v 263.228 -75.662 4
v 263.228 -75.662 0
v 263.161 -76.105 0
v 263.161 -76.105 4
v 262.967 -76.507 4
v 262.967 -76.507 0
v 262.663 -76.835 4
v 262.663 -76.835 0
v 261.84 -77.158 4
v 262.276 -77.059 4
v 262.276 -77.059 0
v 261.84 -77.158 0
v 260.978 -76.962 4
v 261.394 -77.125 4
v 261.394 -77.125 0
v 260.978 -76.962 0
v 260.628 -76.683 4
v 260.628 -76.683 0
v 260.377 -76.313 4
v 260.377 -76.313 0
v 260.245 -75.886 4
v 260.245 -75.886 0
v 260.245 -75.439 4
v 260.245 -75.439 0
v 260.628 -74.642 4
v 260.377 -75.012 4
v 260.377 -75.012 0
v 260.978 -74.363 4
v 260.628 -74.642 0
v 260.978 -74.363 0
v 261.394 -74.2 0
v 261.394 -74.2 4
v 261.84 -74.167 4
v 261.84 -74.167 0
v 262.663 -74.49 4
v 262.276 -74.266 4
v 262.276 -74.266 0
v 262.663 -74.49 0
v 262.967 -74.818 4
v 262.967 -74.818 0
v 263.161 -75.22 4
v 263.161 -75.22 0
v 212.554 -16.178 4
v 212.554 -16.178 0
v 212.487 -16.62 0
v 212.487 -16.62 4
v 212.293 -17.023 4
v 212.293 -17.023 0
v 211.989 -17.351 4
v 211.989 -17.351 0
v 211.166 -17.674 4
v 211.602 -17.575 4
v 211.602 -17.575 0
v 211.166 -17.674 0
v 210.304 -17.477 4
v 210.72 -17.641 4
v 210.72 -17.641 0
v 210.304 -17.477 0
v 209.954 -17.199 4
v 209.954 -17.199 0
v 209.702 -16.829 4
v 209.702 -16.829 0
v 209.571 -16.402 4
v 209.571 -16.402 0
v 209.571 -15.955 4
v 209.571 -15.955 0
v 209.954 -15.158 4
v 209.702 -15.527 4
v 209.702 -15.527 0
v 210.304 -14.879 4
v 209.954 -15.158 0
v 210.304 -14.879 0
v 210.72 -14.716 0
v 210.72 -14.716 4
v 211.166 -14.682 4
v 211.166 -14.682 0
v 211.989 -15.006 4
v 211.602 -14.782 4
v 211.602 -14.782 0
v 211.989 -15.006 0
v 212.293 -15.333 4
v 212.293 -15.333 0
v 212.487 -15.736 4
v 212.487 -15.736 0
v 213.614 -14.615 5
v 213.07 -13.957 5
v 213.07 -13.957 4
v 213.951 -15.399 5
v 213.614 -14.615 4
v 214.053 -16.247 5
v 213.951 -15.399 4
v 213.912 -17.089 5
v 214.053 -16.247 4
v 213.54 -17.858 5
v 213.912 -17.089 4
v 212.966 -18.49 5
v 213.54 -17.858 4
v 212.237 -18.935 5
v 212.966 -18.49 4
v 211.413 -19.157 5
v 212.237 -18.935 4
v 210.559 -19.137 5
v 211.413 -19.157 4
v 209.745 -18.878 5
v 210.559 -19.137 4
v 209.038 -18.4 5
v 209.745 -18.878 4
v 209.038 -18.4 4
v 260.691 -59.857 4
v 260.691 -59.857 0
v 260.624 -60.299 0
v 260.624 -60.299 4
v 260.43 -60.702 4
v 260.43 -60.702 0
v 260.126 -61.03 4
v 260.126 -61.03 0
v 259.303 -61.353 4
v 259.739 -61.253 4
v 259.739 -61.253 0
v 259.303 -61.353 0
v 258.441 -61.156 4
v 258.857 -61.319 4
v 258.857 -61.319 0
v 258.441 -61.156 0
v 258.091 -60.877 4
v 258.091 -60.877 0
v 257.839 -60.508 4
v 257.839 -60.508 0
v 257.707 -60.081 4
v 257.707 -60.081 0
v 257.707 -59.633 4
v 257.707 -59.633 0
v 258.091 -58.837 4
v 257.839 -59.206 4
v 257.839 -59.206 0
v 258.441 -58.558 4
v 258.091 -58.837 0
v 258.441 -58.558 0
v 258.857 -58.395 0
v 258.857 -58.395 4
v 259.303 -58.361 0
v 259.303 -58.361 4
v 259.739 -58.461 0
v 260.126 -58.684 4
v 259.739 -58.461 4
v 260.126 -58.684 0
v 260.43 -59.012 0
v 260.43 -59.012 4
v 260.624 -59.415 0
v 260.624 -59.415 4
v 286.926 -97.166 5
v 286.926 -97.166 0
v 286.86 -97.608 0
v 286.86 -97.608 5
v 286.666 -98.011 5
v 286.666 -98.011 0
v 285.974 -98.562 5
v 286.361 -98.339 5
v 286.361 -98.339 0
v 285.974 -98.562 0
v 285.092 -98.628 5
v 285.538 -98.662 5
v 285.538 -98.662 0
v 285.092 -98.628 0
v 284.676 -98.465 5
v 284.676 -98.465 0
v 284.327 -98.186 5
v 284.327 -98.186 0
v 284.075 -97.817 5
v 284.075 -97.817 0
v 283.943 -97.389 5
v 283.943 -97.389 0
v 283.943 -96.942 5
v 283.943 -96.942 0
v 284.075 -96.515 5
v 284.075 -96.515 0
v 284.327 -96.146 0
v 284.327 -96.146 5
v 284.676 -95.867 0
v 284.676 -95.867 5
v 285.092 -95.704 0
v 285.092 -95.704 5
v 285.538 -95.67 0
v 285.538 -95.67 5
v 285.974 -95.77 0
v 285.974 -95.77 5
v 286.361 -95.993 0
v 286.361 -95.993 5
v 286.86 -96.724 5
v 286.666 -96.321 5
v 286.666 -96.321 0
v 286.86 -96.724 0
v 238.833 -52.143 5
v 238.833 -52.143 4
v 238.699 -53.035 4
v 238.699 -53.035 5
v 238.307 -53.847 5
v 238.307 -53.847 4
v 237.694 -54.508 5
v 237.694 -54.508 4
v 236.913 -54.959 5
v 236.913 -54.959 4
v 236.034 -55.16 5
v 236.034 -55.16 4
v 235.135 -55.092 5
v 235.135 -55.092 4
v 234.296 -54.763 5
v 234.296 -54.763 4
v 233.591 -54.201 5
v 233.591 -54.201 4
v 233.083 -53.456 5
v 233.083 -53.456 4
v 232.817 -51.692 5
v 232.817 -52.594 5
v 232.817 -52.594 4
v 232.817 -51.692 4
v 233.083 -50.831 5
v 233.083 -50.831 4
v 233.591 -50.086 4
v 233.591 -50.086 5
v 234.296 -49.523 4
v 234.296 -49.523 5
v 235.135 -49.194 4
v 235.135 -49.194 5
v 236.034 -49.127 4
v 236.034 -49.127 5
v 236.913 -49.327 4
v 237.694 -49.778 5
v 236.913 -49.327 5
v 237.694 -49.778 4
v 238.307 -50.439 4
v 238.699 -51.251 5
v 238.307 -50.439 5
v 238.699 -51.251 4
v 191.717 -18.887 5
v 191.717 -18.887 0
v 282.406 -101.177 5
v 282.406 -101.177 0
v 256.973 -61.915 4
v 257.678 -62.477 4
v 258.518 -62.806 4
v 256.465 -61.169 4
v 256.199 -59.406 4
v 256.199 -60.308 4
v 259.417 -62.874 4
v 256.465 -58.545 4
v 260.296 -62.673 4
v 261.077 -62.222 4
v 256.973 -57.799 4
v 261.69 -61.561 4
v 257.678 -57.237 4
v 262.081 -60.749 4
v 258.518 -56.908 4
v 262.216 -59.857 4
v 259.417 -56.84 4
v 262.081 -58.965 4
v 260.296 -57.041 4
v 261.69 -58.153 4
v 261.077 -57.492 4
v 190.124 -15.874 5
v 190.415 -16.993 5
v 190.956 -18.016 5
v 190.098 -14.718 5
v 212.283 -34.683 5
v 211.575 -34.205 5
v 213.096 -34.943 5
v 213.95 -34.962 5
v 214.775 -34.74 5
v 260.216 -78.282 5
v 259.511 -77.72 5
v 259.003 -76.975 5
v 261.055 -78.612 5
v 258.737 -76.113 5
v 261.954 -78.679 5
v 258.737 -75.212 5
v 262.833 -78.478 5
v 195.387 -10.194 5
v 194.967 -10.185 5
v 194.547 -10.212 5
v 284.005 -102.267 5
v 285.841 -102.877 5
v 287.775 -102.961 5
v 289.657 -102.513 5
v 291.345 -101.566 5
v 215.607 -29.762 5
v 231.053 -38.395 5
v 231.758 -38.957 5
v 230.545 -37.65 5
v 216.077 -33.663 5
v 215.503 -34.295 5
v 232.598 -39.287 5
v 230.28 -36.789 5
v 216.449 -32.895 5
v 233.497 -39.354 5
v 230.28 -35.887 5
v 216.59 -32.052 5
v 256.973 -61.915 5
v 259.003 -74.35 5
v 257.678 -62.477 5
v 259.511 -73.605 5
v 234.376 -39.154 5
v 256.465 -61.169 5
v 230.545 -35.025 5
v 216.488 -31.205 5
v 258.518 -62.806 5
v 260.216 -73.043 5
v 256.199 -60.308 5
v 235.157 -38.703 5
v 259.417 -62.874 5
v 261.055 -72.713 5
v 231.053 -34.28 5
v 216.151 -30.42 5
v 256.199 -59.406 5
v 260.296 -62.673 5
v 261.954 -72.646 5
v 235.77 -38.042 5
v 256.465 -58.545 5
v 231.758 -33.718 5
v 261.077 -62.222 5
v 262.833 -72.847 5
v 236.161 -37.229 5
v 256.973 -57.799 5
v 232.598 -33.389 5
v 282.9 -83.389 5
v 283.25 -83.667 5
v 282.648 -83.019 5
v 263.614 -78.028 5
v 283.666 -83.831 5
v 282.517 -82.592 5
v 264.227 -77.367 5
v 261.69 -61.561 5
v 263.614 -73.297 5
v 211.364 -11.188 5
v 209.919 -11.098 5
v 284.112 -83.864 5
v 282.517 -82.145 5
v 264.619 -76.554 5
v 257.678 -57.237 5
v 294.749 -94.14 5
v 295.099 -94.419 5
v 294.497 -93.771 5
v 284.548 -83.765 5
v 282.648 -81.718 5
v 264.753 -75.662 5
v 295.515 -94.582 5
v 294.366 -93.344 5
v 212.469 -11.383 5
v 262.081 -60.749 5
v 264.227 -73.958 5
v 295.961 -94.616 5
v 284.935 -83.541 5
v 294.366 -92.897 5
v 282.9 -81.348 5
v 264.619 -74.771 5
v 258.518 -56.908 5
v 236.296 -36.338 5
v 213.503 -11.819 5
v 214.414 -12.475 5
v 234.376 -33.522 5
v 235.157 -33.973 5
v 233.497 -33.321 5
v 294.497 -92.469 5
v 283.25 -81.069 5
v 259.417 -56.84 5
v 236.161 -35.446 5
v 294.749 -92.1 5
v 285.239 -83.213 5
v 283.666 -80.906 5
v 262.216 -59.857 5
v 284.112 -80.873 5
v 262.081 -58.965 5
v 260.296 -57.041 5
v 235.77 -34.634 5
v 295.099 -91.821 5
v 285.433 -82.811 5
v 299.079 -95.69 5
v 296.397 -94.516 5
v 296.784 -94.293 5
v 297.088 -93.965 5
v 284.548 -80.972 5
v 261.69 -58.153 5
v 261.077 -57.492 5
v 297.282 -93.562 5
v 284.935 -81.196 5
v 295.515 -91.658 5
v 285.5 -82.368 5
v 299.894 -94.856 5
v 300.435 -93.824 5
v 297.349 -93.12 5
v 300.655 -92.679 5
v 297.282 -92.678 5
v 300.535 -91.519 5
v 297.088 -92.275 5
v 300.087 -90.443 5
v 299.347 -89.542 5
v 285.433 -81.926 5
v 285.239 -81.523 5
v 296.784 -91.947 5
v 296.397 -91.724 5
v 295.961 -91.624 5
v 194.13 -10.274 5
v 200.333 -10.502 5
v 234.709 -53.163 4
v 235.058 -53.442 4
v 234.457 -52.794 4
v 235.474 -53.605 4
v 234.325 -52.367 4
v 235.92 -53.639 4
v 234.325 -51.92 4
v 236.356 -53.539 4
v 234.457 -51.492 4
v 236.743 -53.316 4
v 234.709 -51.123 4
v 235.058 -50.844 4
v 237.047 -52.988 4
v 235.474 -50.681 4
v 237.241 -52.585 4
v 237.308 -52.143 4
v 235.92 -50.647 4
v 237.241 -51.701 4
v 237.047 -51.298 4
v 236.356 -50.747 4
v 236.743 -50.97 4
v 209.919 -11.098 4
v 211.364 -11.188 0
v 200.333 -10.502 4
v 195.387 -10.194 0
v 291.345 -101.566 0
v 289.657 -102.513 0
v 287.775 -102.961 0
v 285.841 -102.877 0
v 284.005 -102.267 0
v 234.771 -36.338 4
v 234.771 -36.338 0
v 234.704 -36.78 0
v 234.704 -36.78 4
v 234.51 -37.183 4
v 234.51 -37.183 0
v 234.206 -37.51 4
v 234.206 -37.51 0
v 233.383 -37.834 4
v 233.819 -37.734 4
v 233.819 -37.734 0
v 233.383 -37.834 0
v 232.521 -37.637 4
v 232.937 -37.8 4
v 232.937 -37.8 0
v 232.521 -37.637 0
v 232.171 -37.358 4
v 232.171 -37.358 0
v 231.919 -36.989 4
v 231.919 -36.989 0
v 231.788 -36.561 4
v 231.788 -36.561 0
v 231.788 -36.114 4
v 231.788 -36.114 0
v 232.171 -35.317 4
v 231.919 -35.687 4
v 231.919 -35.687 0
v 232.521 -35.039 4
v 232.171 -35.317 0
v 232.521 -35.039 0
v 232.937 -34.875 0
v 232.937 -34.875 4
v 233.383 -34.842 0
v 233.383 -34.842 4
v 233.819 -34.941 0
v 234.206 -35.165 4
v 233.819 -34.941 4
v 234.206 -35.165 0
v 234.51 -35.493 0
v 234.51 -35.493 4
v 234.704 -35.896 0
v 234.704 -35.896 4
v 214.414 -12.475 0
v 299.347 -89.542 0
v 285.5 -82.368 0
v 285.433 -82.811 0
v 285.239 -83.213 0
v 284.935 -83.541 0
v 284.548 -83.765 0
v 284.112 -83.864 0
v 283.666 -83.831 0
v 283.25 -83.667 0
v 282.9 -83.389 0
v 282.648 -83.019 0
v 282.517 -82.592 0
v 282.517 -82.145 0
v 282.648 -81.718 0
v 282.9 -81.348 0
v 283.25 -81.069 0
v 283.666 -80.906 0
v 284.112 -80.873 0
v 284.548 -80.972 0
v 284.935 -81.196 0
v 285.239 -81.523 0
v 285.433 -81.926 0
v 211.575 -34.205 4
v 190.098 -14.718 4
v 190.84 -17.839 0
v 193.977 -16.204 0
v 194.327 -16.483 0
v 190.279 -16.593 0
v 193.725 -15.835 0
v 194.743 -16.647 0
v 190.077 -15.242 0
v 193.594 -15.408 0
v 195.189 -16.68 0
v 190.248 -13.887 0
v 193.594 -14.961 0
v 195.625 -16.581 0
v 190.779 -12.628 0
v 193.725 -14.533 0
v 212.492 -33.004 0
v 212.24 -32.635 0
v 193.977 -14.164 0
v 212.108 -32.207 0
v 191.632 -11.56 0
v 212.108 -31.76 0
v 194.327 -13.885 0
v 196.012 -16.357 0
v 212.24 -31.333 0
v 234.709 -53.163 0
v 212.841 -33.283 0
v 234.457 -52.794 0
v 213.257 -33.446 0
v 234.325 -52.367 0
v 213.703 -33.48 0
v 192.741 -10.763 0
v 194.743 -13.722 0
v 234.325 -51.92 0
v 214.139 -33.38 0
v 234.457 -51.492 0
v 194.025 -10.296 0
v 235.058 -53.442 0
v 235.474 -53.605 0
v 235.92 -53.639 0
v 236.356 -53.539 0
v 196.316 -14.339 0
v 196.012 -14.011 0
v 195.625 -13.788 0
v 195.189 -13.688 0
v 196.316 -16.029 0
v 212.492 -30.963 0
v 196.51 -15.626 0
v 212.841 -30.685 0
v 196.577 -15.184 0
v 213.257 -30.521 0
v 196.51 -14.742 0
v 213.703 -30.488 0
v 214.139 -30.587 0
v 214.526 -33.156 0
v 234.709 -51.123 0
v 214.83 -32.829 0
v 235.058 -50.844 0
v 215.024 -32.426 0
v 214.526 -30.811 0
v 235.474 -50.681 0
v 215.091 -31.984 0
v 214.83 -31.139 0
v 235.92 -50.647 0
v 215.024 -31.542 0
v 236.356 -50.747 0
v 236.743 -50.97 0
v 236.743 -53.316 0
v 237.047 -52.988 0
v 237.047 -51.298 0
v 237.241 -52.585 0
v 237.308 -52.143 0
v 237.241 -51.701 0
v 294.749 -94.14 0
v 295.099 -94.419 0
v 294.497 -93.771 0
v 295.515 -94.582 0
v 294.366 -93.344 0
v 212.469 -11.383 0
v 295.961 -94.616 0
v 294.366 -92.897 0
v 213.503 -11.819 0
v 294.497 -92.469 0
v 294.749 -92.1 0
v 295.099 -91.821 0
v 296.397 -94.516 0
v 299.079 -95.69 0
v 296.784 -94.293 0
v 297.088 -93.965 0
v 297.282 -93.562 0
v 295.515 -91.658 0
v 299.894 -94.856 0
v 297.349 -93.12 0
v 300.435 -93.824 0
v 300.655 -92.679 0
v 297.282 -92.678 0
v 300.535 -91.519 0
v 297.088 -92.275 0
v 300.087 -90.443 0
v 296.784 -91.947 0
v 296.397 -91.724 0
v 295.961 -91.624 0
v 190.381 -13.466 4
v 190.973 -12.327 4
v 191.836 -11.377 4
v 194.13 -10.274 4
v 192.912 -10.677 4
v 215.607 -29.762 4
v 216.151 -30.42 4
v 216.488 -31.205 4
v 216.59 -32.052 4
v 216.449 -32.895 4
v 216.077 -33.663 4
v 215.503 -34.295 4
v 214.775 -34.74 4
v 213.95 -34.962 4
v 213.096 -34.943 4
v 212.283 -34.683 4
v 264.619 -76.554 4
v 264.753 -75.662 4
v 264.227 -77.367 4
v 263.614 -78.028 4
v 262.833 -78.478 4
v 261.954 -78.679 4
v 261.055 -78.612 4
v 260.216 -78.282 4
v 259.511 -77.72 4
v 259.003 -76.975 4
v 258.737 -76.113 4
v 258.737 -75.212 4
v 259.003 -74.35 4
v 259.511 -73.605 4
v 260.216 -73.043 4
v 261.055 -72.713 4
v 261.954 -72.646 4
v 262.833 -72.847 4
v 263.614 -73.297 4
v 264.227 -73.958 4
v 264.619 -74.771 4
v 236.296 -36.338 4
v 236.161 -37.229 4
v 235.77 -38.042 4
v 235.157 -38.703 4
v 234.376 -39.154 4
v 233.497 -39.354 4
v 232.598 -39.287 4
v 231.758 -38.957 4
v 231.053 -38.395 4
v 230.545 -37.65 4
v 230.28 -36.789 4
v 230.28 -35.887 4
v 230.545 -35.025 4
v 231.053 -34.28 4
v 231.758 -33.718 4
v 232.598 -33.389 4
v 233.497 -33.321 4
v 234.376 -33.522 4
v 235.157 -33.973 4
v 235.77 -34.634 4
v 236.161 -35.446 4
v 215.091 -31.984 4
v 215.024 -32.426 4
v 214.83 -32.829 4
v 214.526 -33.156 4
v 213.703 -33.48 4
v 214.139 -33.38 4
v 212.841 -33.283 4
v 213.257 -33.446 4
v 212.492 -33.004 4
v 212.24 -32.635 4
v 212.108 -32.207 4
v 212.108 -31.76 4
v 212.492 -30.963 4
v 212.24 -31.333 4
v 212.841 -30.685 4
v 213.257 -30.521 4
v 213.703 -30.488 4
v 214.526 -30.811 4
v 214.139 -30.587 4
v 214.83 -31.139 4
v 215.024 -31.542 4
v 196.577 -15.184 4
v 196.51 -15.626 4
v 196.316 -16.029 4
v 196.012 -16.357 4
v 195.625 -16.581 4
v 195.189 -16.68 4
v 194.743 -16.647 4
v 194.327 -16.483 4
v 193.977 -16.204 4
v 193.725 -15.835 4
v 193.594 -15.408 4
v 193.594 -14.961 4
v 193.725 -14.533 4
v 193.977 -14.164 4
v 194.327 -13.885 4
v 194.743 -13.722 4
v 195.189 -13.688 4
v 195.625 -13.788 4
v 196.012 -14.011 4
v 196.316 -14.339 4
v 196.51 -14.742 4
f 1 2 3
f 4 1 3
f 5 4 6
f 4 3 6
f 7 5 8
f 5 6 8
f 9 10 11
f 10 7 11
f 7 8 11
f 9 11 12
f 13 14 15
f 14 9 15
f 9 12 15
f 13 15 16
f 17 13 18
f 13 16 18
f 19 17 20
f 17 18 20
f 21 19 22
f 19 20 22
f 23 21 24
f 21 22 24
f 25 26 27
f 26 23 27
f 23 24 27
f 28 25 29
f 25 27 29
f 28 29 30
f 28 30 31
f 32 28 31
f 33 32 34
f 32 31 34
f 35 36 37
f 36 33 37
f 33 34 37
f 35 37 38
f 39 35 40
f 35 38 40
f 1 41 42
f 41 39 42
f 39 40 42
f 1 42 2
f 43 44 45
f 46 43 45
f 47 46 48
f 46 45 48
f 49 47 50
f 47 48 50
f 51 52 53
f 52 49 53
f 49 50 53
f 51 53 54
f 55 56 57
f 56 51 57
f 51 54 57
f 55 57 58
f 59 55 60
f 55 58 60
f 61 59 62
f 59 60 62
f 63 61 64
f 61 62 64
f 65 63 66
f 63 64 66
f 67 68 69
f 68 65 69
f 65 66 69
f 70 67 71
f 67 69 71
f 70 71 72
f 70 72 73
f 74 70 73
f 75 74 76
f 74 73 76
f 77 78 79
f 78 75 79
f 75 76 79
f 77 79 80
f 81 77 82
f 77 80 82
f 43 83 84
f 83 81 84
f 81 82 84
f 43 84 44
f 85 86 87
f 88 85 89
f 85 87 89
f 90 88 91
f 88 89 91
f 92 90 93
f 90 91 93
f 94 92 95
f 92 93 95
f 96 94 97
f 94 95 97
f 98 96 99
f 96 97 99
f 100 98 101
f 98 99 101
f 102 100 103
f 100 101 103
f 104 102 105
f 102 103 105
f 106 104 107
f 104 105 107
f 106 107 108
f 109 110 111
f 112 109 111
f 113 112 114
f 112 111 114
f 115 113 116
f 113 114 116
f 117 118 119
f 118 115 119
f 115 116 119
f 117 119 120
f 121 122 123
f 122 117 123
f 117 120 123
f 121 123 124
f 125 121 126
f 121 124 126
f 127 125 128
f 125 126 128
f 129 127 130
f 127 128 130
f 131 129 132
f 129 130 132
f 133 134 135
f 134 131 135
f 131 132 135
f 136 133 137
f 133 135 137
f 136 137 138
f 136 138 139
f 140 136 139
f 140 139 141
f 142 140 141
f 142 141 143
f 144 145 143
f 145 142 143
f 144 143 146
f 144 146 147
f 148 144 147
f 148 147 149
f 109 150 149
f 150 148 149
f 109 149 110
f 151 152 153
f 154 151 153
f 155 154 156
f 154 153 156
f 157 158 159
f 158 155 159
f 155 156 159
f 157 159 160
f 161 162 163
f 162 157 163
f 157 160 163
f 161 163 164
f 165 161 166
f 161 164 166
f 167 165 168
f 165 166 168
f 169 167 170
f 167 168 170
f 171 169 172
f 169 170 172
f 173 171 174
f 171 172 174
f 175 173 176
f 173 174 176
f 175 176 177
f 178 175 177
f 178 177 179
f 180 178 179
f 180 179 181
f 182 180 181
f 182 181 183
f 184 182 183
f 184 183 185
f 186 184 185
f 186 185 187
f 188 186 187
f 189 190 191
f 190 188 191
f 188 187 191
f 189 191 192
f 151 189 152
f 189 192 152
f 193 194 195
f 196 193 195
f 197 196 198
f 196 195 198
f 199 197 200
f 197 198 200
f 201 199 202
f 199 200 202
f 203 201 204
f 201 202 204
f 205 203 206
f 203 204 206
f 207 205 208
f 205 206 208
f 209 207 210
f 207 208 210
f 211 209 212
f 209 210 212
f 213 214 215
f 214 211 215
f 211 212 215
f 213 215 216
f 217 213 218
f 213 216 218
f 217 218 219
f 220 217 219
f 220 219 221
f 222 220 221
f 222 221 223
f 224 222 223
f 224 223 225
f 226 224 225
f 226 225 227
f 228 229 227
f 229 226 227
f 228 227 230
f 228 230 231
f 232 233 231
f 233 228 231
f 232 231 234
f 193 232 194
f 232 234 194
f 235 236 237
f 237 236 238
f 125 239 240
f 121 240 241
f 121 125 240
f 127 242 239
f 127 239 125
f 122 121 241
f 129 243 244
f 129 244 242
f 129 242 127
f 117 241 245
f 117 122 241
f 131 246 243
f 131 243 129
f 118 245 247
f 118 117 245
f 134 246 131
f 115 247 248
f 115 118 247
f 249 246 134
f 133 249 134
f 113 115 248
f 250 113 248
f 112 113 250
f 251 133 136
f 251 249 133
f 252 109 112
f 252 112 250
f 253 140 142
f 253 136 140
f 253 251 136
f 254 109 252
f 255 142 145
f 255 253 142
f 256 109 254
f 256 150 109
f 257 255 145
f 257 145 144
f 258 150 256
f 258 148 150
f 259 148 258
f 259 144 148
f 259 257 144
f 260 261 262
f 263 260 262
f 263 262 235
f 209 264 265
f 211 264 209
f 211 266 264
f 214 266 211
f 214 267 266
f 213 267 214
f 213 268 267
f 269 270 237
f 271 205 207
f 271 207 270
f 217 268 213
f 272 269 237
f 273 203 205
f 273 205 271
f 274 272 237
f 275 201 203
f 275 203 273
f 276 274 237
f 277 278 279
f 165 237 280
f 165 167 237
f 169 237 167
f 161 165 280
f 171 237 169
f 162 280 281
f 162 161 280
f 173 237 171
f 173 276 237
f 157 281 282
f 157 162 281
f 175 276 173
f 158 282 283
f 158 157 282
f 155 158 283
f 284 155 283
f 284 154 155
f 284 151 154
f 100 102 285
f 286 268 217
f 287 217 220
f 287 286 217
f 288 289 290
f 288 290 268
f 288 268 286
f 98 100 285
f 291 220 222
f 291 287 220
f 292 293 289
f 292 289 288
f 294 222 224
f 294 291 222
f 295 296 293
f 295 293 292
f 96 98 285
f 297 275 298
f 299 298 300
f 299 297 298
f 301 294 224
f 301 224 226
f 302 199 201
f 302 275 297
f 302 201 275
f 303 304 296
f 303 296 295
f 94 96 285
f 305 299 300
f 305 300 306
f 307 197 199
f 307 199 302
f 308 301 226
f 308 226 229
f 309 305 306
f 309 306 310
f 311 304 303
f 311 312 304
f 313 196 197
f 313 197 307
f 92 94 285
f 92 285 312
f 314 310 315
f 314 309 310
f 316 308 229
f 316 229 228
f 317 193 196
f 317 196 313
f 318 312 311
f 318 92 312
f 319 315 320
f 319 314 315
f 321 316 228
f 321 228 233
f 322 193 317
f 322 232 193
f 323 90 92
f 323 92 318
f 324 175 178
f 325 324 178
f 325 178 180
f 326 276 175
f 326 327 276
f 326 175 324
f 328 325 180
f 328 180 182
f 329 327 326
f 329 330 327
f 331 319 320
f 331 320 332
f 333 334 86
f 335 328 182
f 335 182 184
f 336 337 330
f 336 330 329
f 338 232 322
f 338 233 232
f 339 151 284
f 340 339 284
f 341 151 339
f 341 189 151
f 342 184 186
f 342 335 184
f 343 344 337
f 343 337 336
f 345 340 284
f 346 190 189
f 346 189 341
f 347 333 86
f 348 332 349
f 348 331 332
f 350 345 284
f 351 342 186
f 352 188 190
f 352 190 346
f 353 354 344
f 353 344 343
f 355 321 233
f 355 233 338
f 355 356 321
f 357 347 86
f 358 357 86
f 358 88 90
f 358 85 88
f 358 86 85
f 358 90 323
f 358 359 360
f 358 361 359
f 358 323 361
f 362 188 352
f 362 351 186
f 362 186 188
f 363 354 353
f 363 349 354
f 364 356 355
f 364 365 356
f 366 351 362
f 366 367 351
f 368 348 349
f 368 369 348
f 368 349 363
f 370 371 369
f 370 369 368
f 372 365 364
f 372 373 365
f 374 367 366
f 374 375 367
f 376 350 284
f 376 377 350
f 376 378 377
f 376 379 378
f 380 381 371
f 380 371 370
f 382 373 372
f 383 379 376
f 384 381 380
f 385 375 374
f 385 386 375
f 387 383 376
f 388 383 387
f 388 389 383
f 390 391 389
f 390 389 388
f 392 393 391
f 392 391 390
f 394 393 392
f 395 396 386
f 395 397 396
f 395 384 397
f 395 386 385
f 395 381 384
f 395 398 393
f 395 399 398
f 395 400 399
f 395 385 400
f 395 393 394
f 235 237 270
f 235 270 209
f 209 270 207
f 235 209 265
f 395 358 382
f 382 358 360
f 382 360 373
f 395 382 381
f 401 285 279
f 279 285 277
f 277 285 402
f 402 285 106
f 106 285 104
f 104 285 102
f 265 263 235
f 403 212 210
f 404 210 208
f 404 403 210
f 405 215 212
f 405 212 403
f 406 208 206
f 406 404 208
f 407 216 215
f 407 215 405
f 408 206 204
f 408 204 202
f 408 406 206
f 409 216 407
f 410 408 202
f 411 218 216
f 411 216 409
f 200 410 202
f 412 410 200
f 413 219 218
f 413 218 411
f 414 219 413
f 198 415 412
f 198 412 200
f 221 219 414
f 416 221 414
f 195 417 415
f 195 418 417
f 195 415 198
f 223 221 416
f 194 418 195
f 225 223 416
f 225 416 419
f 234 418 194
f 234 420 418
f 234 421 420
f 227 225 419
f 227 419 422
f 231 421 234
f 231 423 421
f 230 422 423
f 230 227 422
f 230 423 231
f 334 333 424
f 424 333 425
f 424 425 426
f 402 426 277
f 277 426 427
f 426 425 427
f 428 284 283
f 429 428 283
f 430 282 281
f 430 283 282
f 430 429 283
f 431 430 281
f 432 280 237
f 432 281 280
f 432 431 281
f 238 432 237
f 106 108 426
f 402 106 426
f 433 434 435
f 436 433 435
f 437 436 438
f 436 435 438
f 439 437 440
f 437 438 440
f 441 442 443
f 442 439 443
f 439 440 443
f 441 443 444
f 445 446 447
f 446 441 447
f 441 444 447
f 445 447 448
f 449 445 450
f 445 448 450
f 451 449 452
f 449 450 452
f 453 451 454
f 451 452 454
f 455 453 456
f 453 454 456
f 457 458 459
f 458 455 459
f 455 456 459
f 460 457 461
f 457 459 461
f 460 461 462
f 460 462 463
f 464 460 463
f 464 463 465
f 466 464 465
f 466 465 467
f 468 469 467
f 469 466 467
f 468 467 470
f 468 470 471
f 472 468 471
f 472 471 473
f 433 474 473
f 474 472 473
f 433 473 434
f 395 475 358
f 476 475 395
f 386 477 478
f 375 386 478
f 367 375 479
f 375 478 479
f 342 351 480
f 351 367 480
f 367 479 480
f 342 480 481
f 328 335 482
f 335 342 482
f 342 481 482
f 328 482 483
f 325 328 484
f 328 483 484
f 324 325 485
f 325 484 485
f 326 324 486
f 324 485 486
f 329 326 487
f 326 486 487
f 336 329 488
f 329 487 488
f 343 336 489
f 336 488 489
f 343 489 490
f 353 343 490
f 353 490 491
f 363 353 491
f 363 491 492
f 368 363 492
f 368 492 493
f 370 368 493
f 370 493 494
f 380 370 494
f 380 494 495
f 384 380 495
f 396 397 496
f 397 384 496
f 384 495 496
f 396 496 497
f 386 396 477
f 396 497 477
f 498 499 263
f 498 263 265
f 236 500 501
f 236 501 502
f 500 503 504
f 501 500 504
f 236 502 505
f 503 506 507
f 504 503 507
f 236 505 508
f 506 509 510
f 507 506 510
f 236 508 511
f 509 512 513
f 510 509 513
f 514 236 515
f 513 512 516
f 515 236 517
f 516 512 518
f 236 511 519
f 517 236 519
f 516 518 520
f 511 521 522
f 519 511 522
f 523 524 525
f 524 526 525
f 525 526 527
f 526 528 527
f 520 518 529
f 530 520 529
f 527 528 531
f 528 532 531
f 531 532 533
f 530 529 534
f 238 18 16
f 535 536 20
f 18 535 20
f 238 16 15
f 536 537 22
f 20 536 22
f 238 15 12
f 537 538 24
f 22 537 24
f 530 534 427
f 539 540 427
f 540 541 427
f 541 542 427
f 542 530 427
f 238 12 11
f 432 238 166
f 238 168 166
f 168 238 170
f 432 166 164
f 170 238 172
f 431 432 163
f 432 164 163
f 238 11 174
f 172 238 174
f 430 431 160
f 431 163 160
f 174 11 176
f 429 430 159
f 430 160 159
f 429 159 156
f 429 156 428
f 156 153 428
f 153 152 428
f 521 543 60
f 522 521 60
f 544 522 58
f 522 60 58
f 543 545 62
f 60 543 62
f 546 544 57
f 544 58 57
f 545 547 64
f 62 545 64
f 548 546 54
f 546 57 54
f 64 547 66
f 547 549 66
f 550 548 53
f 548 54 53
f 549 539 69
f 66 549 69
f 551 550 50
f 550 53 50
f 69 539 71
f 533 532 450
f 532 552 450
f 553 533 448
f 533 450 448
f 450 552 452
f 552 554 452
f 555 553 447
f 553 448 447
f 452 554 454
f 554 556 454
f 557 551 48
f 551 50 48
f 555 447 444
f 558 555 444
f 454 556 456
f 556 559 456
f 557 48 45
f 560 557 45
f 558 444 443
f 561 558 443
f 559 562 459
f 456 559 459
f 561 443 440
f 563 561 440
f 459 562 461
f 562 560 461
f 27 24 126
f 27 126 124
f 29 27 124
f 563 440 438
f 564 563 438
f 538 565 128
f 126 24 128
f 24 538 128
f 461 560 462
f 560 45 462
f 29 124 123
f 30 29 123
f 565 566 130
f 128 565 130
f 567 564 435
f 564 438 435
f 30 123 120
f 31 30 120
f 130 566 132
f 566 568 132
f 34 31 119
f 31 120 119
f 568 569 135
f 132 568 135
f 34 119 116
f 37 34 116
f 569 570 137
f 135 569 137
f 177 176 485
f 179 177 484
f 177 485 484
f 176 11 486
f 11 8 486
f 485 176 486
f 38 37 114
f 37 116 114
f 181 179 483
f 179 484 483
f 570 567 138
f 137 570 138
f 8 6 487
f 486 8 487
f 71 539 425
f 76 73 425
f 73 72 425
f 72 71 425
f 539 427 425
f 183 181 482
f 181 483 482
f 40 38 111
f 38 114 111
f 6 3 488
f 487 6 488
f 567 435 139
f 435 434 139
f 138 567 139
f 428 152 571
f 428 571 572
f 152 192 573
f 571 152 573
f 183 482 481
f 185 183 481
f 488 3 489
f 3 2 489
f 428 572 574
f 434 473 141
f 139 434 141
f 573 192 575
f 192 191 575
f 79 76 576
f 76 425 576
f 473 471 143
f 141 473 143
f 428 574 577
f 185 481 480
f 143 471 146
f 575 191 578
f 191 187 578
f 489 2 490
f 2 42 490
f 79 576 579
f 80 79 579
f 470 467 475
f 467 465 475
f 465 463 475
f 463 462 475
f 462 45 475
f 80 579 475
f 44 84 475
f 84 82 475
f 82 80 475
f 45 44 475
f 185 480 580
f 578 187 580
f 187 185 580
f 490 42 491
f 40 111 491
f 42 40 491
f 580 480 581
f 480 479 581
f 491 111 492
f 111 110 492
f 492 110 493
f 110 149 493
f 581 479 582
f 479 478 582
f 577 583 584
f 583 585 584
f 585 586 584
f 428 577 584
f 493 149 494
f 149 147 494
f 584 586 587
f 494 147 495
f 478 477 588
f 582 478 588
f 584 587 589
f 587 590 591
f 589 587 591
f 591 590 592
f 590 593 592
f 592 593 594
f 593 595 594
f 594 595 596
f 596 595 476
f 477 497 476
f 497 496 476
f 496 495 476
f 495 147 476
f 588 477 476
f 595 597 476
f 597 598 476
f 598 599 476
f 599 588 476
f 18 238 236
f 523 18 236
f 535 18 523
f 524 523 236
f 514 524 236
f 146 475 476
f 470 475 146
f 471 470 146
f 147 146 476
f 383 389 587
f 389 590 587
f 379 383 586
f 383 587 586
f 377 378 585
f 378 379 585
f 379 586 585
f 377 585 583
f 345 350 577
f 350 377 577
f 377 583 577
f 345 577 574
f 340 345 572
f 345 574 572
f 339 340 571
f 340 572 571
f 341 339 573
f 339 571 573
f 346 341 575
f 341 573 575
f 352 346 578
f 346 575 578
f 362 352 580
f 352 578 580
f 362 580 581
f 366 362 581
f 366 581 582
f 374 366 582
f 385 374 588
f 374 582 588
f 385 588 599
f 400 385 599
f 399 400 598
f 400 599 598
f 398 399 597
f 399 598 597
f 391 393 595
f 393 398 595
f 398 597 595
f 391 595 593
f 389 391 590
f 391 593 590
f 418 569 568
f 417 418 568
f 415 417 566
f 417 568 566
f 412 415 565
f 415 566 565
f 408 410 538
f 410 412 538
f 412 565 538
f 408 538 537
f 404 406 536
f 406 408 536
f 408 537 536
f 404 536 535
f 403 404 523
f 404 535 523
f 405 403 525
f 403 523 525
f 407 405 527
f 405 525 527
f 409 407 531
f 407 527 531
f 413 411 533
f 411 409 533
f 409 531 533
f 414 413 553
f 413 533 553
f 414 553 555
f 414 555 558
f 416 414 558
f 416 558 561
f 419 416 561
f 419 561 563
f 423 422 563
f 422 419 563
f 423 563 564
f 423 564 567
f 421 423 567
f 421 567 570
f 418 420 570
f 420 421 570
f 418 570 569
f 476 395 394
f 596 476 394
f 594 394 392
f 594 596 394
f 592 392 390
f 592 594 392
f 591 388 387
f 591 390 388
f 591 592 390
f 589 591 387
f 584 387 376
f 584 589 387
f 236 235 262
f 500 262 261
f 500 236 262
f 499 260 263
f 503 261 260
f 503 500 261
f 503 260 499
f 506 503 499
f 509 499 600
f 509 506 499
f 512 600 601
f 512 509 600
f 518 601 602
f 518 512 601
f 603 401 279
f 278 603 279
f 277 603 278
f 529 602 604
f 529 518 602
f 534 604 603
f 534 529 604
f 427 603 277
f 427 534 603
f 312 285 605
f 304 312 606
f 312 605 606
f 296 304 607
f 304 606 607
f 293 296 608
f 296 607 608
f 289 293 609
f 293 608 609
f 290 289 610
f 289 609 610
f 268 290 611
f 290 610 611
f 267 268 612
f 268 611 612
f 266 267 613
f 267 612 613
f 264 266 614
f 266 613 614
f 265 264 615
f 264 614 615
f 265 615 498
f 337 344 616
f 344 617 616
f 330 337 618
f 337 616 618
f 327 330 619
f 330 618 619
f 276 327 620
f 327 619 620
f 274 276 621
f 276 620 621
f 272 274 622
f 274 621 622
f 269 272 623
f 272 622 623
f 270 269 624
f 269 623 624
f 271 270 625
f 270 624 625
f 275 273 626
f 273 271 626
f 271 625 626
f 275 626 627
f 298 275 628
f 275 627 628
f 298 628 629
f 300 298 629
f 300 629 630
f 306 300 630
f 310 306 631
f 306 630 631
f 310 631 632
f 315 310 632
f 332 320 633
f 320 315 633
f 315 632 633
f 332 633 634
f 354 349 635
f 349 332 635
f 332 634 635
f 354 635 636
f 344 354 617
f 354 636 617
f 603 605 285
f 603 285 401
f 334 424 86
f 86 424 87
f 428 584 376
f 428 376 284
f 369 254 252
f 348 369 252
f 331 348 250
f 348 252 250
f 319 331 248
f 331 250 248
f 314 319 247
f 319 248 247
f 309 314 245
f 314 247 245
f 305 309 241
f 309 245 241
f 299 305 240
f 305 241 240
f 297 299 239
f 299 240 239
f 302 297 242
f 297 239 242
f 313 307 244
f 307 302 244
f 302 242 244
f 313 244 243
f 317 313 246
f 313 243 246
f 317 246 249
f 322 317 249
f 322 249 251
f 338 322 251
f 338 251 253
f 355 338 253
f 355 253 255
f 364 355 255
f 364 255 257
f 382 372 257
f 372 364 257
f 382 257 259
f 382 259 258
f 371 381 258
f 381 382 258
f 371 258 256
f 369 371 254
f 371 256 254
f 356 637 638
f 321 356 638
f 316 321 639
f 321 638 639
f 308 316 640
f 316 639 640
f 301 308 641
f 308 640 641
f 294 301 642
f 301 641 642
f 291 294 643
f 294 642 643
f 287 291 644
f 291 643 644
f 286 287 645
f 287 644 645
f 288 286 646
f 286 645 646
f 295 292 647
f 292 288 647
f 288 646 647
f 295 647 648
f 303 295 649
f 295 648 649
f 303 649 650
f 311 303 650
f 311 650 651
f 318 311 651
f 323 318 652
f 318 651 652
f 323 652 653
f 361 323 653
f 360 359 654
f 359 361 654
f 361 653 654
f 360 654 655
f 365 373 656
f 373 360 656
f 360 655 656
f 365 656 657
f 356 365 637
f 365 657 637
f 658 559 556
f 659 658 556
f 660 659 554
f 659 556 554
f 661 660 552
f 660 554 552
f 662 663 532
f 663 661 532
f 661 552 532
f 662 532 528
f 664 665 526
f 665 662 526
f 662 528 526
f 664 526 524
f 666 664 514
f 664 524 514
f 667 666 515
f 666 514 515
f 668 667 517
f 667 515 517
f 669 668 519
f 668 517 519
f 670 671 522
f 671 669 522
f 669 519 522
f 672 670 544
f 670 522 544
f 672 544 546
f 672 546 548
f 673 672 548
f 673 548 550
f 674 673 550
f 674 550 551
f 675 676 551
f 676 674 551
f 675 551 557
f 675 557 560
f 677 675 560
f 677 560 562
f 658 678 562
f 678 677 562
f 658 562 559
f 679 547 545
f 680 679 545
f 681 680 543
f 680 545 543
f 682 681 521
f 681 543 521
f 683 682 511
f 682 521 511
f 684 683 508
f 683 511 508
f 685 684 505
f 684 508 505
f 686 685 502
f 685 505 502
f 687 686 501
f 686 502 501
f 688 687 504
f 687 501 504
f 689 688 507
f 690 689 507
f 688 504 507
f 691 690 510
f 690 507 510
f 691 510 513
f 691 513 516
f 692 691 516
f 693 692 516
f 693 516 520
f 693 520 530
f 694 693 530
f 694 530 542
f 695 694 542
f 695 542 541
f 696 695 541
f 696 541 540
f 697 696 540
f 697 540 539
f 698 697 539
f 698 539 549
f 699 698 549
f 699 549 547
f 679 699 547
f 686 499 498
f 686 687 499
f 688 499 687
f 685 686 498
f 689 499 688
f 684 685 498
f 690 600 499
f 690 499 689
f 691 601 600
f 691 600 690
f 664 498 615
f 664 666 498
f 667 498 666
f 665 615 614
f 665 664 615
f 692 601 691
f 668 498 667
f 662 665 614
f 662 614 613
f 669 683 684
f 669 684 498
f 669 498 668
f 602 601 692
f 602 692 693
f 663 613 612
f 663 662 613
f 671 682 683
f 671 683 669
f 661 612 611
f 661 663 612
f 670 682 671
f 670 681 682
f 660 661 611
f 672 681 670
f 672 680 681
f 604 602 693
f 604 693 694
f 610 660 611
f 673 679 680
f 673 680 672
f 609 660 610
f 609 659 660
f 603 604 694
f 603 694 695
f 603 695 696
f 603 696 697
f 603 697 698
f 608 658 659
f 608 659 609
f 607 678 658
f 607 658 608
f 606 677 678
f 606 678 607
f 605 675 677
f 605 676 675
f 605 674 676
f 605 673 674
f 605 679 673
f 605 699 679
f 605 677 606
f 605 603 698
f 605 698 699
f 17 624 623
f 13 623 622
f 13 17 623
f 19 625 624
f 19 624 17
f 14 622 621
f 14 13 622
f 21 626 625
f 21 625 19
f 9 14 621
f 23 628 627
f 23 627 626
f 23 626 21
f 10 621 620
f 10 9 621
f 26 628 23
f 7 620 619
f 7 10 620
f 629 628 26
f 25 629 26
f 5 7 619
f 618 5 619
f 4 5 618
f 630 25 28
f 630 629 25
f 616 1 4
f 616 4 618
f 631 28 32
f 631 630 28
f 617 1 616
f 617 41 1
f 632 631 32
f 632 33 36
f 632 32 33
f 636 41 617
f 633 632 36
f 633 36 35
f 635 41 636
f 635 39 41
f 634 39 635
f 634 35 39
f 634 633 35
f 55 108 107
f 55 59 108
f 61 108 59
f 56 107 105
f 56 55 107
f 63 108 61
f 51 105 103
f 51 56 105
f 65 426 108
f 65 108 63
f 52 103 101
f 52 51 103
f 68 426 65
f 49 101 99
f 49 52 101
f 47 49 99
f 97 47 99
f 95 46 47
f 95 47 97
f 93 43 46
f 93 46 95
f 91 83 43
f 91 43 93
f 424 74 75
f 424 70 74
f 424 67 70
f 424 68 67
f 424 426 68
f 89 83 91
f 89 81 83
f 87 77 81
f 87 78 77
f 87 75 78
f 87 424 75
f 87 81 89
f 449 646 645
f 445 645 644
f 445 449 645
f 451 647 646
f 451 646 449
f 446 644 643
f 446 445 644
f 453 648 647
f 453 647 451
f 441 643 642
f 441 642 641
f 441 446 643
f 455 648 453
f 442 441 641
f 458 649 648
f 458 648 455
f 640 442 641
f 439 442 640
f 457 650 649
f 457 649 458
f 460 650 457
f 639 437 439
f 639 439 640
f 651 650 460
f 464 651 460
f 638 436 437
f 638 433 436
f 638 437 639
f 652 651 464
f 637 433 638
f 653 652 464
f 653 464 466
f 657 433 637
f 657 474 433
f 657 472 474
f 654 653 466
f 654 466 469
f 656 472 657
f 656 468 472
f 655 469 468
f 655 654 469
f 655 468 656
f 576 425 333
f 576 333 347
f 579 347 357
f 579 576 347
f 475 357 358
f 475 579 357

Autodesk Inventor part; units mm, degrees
ref_plane "YZ Plane" through (0, 0, 0) normal (1, 0, 0) x (0, 1, 0)
ref_plane "XZ Plane" through (0, 0, 0) normal (0, 1, 0) x (-1, 0, 0)
ref_plane "XY Plane" through (0, 0, 0) normal (0, 0, 1) x (1, 0, 0)
sketch "スケッチ1" plane through (0, 0, 0) normal (0, 0, 1) x (1, 0, 0)
  circle A0 centre (211.0538, -16.1783) radius 3
  circle A1 centre (195.0769, -15.1842) radius 3
  circle A2 centre (213.5911, -31.9837) radius 3
  line L0 (195.0769, -15.1842) -> (213.5911, -31.9837) construction
  line L1 (185.1065, 0.6143) -> (518.3624, -301.7771) construction
  circle A3 centre (185.1065, 0.6143) radius 8
  line L2 (204.334, -23.584) -> (211.0538, -16.1783) construction
  line L3 (185.1065, 0.6143) -> (181.7466, -3.0885)
  line L4 (181.7466, -3.0885) -> (195.0769, -15.1842)
  line L5 (211.0538, -16.1783) -> (195.0769, -15.1842) construction
  line L6 (213.748, -11.3362) -> (182.759, -9.4081)
  line L7 (186.8707, -14.4897) -> (289.472, -107.5885)
  arc A4 (195.3874, -10.1938) -> (196.9446, -10.5462) centre (195.0769, -15.1842) ccw
  arc A5 (214.4137, -12.4754) -> (211.3643, -11.1879) centre (211.0538, -16.1783) ccw
  line L8 (214.4137, -12.4754) -> (302.9116, -92.7771)
  line L9 (302.9116, -92.7771) -> (289.472, -107.5885) construction
  circle A6 centre (295.8489, -93.1201) radius 3.025
  circle A7 centre (285.4262, -97.1659) radius 3.025
  circle A8 centre (283.9998, -82.3684) radius 3.025
  line L10 (281.7596, -80.3356) -> (285.1195, -76.6328)
  line L11 (285.1195, -76.6328) -> (289.5999, -80.6983)
  line L12 (289.5999, -80.6983) -> (286.24, -84.4011)
  line L13 (286.24, -84.4011) -> (281.7596, -80.3356) construction
  arc A9 (282.4058, -101.1768) -> (291.3448, -101.5663) centre (287.1097, -95.9928) ccw
  line L14 (302.9116, -92.7771) -> (291.3448, -101.5663)
  arc A10 (299.0788, -95.6895) -> (299.3467, -89.5424) centre (296.6588, -92.5047) ccw
  circle A11 centre (295.8489, -93.1201) radius 1.5
  circle A12 centre (285.4262, -97.1659) radius 1.5
  line L15 (213.5911, -31.9837) -> (181.7466, -3.0885) construction
  line L16 (215.607, -29.762) -> (183.7626, -0.8668)
  line L17 (179.7307, -5.3102) -> (211.5751, -34.2054)
  arc A13 (211.5751, -34.2054) -> (215.607, -29.762) centre (213.5911, -31.9837) ccw
  arc A14 (183.7626, -0.8668) -> (179.7307, -5.3102) centre (181.7466, -3.0885) ccw
  line L18 (211.0538, -16.1783) -> (189.2132, 3.6395) construction
  line L19 (209.0378, -18.4) -> (187.1973, 1.4178)
  line L20 (191.2292, 5.8612) -> (213.0697, -13.9566)
  arc A15 (209.0378, -18.4) -> (213.0697, -13.9566) centre (211.0538, -16.1783) ccw
  arc A16 (191.2292, 5.8612) -> (187.1973, 1.4178) centre (189.2132, 3.6395) ccw
  circle A17 centre (195.0769, -15.1842) radius 1.5
  circle A18 centre (211.0538, -16.1783) radius 1.5
  circle A19 centre (213.5911, -31.9837) radius 1.5
  circle A20 centre (283.9998, -82.3684) radius 1.5
  circle A21 centre (233.2708, -36.3377) radius 3.025
  circle A22 centre (235.8081, -52.1431) radius 3.025
  circle A23 centre (259.1907, -59.857) radius 3.025
  circle A24 centre (261.728, -75.6625) radius 3.025
  line L21 (211.0538, -16.1783) -> (283.9998, -82.3684) construction
  line L22 (285.4262, -97.1659) -> (213.5911, -31.9837) construction
  circle A25 centre (233.2708, -36.3377) radius 1.5
  circle A26 centre (235.8081, -52.1431) radius 1.5
  circle A27 centre (259.1907, -59.857) radius 1.5
  circle A28 centre (261.728, -75.6625) radius 1.5
  point P0 (0, 0)
  point P1 (0, 0)
  point P2 (207.6939, -19.8811)
  point P3 (191.717, -18.887)
  point P4 (197.6688, -17.5361)
  point P5 (200.1335, -6.2694)
  point P6 (209.9194, -11.098)
  point P7 (200.3333, -10.5016)
  point P8 (194.1305, -10.2746)
  point P9 (196.0232, -20.0938)
  point P10 (289.5999, -80.6983)
  point P11 (286.24, -84.4011)
  point P12 (190.0986, -14.718)
  dimension "d13" = 6.05
  dimension "d0" = 6
  dimension "d1" = 25
  dimension "d2" = 10
  dimension "d3" = 18
  dimension "d4" = 5
  dimension "d5" = 5
  dimension "d6" = 150
  dimension "d7" = 6.05
  dimension "d8" = 5
  dimension "d9" = 5
  dimension "d10" = 6.05
  dimension "d11" = 5
  dimension "d12" = 10
  dimension "d14" = 5
  dimension "d15" = 16
  dimension "d16" = 4
  dimension "d17" = 7
  dimension "d18" = 4
  dimension "d19" = 3
  dimension "d20" = 3
  dimension "d23" = 3
  dimension "d24" = 3
  dimension "d25" = 3
  dimension "d26" = 3
  dimension "d29" = 30
  dimension "d30" = 30
  dimension "d31" = 35
  dimension "d32" = 35
  dimension "d33" = 3
  dimension "d34" = 3
  dimension "d35" = 3
  dimension "d36" = 3
extrude "押し出し1" add sketch "スケッチ1" along normal blind 5 contours A0 L20 L6 A5 L8 L10 A8 L12 A10 L14 A9 L7 A4 L17 A2 L16 L19 | L8 L12 A8 L10 | A8 | L17 A4 | A6 | A7
extrude "押し出し2" add sketch "スケッチ1" along normal blind 4 contours A0 | A0 L19 L6 L20 | L16 A1 L4 A4 | L4 A1 L17 A4 | L16 A4 L17 A1 | A1 | L16 A2 L17 A4 | A2 | A21 | A22 | A23 | A24
properties part number "アーム先1" material "ポリカーボネート、スモーク"
